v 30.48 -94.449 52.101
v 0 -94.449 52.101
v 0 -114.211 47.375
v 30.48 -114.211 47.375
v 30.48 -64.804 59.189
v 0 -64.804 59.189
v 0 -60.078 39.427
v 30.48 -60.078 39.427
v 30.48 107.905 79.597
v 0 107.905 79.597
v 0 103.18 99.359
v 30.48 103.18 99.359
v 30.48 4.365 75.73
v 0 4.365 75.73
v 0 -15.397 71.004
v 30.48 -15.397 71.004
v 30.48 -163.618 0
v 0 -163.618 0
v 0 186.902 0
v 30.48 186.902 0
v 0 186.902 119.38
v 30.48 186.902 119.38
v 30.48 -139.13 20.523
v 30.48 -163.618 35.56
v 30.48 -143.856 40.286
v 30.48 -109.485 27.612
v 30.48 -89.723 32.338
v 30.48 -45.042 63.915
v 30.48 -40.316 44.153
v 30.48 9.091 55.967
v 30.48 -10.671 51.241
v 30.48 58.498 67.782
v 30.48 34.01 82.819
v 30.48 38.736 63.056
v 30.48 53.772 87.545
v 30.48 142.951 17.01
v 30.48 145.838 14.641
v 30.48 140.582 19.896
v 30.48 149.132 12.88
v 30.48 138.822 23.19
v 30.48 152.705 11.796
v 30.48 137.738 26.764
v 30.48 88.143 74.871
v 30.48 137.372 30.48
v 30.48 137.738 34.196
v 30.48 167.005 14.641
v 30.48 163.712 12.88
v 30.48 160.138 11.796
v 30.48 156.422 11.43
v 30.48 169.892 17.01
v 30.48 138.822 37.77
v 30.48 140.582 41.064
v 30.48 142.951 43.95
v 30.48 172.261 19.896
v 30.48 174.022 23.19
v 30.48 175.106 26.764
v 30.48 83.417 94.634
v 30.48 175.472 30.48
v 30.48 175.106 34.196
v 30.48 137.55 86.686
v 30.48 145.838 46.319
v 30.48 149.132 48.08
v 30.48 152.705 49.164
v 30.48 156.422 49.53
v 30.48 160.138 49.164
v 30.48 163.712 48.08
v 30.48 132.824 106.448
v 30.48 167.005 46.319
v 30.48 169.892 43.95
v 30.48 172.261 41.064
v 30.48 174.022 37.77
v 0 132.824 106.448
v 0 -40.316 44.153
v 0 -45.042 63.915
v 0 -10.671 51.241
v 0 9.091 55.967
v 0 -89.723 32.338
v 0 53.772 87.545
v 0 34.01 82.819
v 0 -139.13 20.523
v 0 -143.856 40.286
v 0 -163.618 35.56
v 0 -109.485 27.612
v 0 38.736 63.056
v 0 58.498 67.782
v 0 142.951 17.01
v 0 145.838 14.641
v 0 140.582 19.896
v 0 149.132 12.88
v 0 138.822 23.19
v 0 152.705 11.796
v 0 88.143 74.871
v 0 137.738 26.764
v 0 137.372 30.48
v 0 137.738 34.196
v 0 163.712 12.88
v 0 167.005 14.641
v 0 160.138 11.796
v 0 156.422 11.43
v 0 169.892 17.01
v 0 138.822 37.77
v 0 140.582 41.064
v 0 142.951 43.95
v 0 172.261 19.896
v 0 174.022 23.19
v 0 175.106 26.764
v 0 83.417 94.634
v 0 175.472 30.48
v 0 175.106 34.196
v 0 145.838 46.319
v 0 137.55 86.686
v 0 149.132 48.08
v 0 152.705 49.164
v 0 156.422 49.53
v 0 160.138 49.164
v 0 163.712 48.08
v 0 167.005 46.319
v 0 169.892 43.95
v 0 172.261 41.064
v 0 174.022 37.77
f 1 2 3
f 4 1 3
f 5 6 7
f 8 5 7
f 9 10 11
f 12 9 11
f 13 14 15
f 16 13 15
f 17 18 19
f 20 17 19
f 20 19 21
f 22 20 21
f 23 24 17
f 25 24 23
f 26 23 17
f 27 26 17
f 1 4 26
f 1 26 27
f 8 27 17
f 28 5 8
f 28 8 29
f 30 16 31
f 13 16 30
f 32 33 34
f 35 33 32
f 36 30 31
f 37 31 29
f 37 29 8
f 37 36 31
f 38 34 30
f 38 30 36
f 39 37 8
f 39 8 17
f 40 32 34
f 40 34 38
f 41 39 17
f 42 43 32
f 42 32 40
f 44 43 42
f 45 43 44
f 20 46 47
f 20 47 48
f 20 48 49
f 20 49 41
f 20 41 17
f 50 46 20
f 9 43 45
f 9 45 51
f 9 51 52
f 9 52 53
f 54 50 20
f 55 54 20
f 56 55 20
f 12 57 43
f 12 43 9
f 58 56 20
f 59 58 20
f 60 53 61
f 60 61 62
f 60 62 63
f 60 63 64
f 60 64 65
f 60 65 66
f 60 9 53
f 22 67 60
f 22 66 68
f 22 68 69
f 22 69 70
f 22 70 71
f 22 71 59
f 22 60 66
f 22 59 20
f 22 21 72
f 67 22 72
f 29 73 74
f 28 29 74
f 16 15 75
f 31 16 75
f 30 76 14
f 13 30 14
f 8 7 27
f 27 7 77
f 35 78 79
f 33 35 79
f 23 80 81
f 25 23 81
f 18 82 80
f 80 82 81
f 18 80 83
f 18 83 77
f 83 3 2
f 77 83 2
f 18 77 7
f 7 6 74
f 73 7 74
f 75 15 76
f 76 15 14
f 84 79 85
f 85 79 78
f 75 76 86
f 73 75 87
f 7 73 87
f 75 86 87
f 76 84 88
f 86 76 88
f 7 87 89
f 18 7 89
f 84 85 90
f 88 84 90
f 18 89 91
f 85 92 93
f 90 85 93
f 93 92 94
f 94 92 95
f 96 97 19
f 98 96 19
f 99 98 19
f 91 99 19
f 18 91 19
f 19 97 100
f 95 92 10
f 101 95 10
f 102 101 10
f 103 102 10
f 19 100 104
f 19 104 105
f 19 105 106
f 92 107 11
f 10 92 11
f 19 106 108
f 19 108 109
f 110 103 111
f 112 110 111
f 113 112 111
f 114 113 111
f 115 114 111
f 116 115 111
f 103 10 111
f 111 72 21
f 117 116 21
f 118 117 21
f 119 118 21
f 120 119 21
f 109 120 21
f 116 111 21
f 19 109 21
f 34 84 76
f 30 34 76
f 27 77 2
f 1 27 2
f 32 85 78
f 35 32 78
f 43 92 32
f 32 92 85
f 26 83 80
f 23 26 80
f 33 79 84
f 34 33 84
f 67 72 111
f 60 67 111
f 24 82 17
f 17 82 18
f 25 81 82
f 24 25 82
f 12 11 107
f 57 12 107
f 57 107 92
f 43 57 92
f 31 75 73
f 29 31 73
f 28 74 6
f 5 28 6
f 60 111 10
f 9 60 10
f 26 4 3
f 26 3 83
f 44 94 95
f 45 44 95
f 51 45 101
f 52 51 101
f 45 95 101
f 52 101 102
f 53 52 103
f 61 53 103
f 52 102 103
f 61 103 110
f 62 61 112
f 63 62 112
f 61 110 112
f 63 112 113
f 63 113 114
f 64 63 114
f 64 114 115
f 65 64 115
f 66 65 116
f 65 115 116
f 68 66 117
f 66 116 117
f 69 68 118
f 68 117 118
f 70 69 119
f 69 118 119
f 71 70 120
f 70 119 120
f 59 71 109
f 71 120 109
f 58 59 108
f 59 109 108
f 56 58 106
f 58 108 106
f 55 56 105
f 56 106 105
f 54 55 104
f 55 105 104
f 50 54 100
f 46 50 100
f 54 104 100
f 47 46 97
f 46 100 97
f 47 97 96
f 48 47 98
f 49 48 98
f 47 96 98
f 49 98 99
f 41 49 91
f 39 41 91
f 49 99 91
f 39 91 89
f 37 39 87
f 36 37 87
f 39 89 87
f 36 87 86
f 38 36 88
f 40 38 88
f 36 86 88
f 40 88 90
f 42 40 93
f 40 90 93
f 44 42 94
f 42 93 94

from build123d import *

# Parameters (mm, degrees)
F1_DEPTH = 30.48
F2_R     = 19.05
F3_DEPTH = 30.48


with BuildPart() as f1:
    # F0 (on Right) → F1 (new body)
    with BuildSketch(Plane.YZ):
        Polygon((-163.618337, 35.56), (-163.618337, 0), (186.901663, 0), (186.901663, 119.38), (132.82371, 106.448315), (137.549597, 86.685512), (107.905393, 79.596681), (103.179505, 99.359484), (83.416702, 94.633596), (88.14259, 74.870793), (58.498385, 67.781962), (53.772497, 87.544765), (34.009694, 82.818877), (38.735582, 63.056074), (9.091377, 55.967242), (4.36549, 75.730045), (-15.397313, 71.004158), (-10.671426, 51.241355), (-40.31563, 44.152523), (-45.041518, 63.915326), (-64.804321, 59.189438), (-60.078433, 39.426635), (-89.722638, 32.337804), (-94.448526, 52.100607), (-114.211329, 47.374719), (-109.485441, 27.611916), (-139.129646, 20.523085), (-143.855533, 40.285888), align=None)
    extrude(amount=F1_DEPTH)

    # F2 (on face) → F3 (cut, through all)
    with BuildSketch(Plane(origin=(0, 0, 0), x_dir=(0, -1, 0), z_dir=(-1, 0, 0))):
        with Locations((-156.421663, 30.48)):
            Circle(F2_R)
    extrude(amount=-F3_DEPTH, mode=Mode.SUBTRACT)


solid = f1.part
